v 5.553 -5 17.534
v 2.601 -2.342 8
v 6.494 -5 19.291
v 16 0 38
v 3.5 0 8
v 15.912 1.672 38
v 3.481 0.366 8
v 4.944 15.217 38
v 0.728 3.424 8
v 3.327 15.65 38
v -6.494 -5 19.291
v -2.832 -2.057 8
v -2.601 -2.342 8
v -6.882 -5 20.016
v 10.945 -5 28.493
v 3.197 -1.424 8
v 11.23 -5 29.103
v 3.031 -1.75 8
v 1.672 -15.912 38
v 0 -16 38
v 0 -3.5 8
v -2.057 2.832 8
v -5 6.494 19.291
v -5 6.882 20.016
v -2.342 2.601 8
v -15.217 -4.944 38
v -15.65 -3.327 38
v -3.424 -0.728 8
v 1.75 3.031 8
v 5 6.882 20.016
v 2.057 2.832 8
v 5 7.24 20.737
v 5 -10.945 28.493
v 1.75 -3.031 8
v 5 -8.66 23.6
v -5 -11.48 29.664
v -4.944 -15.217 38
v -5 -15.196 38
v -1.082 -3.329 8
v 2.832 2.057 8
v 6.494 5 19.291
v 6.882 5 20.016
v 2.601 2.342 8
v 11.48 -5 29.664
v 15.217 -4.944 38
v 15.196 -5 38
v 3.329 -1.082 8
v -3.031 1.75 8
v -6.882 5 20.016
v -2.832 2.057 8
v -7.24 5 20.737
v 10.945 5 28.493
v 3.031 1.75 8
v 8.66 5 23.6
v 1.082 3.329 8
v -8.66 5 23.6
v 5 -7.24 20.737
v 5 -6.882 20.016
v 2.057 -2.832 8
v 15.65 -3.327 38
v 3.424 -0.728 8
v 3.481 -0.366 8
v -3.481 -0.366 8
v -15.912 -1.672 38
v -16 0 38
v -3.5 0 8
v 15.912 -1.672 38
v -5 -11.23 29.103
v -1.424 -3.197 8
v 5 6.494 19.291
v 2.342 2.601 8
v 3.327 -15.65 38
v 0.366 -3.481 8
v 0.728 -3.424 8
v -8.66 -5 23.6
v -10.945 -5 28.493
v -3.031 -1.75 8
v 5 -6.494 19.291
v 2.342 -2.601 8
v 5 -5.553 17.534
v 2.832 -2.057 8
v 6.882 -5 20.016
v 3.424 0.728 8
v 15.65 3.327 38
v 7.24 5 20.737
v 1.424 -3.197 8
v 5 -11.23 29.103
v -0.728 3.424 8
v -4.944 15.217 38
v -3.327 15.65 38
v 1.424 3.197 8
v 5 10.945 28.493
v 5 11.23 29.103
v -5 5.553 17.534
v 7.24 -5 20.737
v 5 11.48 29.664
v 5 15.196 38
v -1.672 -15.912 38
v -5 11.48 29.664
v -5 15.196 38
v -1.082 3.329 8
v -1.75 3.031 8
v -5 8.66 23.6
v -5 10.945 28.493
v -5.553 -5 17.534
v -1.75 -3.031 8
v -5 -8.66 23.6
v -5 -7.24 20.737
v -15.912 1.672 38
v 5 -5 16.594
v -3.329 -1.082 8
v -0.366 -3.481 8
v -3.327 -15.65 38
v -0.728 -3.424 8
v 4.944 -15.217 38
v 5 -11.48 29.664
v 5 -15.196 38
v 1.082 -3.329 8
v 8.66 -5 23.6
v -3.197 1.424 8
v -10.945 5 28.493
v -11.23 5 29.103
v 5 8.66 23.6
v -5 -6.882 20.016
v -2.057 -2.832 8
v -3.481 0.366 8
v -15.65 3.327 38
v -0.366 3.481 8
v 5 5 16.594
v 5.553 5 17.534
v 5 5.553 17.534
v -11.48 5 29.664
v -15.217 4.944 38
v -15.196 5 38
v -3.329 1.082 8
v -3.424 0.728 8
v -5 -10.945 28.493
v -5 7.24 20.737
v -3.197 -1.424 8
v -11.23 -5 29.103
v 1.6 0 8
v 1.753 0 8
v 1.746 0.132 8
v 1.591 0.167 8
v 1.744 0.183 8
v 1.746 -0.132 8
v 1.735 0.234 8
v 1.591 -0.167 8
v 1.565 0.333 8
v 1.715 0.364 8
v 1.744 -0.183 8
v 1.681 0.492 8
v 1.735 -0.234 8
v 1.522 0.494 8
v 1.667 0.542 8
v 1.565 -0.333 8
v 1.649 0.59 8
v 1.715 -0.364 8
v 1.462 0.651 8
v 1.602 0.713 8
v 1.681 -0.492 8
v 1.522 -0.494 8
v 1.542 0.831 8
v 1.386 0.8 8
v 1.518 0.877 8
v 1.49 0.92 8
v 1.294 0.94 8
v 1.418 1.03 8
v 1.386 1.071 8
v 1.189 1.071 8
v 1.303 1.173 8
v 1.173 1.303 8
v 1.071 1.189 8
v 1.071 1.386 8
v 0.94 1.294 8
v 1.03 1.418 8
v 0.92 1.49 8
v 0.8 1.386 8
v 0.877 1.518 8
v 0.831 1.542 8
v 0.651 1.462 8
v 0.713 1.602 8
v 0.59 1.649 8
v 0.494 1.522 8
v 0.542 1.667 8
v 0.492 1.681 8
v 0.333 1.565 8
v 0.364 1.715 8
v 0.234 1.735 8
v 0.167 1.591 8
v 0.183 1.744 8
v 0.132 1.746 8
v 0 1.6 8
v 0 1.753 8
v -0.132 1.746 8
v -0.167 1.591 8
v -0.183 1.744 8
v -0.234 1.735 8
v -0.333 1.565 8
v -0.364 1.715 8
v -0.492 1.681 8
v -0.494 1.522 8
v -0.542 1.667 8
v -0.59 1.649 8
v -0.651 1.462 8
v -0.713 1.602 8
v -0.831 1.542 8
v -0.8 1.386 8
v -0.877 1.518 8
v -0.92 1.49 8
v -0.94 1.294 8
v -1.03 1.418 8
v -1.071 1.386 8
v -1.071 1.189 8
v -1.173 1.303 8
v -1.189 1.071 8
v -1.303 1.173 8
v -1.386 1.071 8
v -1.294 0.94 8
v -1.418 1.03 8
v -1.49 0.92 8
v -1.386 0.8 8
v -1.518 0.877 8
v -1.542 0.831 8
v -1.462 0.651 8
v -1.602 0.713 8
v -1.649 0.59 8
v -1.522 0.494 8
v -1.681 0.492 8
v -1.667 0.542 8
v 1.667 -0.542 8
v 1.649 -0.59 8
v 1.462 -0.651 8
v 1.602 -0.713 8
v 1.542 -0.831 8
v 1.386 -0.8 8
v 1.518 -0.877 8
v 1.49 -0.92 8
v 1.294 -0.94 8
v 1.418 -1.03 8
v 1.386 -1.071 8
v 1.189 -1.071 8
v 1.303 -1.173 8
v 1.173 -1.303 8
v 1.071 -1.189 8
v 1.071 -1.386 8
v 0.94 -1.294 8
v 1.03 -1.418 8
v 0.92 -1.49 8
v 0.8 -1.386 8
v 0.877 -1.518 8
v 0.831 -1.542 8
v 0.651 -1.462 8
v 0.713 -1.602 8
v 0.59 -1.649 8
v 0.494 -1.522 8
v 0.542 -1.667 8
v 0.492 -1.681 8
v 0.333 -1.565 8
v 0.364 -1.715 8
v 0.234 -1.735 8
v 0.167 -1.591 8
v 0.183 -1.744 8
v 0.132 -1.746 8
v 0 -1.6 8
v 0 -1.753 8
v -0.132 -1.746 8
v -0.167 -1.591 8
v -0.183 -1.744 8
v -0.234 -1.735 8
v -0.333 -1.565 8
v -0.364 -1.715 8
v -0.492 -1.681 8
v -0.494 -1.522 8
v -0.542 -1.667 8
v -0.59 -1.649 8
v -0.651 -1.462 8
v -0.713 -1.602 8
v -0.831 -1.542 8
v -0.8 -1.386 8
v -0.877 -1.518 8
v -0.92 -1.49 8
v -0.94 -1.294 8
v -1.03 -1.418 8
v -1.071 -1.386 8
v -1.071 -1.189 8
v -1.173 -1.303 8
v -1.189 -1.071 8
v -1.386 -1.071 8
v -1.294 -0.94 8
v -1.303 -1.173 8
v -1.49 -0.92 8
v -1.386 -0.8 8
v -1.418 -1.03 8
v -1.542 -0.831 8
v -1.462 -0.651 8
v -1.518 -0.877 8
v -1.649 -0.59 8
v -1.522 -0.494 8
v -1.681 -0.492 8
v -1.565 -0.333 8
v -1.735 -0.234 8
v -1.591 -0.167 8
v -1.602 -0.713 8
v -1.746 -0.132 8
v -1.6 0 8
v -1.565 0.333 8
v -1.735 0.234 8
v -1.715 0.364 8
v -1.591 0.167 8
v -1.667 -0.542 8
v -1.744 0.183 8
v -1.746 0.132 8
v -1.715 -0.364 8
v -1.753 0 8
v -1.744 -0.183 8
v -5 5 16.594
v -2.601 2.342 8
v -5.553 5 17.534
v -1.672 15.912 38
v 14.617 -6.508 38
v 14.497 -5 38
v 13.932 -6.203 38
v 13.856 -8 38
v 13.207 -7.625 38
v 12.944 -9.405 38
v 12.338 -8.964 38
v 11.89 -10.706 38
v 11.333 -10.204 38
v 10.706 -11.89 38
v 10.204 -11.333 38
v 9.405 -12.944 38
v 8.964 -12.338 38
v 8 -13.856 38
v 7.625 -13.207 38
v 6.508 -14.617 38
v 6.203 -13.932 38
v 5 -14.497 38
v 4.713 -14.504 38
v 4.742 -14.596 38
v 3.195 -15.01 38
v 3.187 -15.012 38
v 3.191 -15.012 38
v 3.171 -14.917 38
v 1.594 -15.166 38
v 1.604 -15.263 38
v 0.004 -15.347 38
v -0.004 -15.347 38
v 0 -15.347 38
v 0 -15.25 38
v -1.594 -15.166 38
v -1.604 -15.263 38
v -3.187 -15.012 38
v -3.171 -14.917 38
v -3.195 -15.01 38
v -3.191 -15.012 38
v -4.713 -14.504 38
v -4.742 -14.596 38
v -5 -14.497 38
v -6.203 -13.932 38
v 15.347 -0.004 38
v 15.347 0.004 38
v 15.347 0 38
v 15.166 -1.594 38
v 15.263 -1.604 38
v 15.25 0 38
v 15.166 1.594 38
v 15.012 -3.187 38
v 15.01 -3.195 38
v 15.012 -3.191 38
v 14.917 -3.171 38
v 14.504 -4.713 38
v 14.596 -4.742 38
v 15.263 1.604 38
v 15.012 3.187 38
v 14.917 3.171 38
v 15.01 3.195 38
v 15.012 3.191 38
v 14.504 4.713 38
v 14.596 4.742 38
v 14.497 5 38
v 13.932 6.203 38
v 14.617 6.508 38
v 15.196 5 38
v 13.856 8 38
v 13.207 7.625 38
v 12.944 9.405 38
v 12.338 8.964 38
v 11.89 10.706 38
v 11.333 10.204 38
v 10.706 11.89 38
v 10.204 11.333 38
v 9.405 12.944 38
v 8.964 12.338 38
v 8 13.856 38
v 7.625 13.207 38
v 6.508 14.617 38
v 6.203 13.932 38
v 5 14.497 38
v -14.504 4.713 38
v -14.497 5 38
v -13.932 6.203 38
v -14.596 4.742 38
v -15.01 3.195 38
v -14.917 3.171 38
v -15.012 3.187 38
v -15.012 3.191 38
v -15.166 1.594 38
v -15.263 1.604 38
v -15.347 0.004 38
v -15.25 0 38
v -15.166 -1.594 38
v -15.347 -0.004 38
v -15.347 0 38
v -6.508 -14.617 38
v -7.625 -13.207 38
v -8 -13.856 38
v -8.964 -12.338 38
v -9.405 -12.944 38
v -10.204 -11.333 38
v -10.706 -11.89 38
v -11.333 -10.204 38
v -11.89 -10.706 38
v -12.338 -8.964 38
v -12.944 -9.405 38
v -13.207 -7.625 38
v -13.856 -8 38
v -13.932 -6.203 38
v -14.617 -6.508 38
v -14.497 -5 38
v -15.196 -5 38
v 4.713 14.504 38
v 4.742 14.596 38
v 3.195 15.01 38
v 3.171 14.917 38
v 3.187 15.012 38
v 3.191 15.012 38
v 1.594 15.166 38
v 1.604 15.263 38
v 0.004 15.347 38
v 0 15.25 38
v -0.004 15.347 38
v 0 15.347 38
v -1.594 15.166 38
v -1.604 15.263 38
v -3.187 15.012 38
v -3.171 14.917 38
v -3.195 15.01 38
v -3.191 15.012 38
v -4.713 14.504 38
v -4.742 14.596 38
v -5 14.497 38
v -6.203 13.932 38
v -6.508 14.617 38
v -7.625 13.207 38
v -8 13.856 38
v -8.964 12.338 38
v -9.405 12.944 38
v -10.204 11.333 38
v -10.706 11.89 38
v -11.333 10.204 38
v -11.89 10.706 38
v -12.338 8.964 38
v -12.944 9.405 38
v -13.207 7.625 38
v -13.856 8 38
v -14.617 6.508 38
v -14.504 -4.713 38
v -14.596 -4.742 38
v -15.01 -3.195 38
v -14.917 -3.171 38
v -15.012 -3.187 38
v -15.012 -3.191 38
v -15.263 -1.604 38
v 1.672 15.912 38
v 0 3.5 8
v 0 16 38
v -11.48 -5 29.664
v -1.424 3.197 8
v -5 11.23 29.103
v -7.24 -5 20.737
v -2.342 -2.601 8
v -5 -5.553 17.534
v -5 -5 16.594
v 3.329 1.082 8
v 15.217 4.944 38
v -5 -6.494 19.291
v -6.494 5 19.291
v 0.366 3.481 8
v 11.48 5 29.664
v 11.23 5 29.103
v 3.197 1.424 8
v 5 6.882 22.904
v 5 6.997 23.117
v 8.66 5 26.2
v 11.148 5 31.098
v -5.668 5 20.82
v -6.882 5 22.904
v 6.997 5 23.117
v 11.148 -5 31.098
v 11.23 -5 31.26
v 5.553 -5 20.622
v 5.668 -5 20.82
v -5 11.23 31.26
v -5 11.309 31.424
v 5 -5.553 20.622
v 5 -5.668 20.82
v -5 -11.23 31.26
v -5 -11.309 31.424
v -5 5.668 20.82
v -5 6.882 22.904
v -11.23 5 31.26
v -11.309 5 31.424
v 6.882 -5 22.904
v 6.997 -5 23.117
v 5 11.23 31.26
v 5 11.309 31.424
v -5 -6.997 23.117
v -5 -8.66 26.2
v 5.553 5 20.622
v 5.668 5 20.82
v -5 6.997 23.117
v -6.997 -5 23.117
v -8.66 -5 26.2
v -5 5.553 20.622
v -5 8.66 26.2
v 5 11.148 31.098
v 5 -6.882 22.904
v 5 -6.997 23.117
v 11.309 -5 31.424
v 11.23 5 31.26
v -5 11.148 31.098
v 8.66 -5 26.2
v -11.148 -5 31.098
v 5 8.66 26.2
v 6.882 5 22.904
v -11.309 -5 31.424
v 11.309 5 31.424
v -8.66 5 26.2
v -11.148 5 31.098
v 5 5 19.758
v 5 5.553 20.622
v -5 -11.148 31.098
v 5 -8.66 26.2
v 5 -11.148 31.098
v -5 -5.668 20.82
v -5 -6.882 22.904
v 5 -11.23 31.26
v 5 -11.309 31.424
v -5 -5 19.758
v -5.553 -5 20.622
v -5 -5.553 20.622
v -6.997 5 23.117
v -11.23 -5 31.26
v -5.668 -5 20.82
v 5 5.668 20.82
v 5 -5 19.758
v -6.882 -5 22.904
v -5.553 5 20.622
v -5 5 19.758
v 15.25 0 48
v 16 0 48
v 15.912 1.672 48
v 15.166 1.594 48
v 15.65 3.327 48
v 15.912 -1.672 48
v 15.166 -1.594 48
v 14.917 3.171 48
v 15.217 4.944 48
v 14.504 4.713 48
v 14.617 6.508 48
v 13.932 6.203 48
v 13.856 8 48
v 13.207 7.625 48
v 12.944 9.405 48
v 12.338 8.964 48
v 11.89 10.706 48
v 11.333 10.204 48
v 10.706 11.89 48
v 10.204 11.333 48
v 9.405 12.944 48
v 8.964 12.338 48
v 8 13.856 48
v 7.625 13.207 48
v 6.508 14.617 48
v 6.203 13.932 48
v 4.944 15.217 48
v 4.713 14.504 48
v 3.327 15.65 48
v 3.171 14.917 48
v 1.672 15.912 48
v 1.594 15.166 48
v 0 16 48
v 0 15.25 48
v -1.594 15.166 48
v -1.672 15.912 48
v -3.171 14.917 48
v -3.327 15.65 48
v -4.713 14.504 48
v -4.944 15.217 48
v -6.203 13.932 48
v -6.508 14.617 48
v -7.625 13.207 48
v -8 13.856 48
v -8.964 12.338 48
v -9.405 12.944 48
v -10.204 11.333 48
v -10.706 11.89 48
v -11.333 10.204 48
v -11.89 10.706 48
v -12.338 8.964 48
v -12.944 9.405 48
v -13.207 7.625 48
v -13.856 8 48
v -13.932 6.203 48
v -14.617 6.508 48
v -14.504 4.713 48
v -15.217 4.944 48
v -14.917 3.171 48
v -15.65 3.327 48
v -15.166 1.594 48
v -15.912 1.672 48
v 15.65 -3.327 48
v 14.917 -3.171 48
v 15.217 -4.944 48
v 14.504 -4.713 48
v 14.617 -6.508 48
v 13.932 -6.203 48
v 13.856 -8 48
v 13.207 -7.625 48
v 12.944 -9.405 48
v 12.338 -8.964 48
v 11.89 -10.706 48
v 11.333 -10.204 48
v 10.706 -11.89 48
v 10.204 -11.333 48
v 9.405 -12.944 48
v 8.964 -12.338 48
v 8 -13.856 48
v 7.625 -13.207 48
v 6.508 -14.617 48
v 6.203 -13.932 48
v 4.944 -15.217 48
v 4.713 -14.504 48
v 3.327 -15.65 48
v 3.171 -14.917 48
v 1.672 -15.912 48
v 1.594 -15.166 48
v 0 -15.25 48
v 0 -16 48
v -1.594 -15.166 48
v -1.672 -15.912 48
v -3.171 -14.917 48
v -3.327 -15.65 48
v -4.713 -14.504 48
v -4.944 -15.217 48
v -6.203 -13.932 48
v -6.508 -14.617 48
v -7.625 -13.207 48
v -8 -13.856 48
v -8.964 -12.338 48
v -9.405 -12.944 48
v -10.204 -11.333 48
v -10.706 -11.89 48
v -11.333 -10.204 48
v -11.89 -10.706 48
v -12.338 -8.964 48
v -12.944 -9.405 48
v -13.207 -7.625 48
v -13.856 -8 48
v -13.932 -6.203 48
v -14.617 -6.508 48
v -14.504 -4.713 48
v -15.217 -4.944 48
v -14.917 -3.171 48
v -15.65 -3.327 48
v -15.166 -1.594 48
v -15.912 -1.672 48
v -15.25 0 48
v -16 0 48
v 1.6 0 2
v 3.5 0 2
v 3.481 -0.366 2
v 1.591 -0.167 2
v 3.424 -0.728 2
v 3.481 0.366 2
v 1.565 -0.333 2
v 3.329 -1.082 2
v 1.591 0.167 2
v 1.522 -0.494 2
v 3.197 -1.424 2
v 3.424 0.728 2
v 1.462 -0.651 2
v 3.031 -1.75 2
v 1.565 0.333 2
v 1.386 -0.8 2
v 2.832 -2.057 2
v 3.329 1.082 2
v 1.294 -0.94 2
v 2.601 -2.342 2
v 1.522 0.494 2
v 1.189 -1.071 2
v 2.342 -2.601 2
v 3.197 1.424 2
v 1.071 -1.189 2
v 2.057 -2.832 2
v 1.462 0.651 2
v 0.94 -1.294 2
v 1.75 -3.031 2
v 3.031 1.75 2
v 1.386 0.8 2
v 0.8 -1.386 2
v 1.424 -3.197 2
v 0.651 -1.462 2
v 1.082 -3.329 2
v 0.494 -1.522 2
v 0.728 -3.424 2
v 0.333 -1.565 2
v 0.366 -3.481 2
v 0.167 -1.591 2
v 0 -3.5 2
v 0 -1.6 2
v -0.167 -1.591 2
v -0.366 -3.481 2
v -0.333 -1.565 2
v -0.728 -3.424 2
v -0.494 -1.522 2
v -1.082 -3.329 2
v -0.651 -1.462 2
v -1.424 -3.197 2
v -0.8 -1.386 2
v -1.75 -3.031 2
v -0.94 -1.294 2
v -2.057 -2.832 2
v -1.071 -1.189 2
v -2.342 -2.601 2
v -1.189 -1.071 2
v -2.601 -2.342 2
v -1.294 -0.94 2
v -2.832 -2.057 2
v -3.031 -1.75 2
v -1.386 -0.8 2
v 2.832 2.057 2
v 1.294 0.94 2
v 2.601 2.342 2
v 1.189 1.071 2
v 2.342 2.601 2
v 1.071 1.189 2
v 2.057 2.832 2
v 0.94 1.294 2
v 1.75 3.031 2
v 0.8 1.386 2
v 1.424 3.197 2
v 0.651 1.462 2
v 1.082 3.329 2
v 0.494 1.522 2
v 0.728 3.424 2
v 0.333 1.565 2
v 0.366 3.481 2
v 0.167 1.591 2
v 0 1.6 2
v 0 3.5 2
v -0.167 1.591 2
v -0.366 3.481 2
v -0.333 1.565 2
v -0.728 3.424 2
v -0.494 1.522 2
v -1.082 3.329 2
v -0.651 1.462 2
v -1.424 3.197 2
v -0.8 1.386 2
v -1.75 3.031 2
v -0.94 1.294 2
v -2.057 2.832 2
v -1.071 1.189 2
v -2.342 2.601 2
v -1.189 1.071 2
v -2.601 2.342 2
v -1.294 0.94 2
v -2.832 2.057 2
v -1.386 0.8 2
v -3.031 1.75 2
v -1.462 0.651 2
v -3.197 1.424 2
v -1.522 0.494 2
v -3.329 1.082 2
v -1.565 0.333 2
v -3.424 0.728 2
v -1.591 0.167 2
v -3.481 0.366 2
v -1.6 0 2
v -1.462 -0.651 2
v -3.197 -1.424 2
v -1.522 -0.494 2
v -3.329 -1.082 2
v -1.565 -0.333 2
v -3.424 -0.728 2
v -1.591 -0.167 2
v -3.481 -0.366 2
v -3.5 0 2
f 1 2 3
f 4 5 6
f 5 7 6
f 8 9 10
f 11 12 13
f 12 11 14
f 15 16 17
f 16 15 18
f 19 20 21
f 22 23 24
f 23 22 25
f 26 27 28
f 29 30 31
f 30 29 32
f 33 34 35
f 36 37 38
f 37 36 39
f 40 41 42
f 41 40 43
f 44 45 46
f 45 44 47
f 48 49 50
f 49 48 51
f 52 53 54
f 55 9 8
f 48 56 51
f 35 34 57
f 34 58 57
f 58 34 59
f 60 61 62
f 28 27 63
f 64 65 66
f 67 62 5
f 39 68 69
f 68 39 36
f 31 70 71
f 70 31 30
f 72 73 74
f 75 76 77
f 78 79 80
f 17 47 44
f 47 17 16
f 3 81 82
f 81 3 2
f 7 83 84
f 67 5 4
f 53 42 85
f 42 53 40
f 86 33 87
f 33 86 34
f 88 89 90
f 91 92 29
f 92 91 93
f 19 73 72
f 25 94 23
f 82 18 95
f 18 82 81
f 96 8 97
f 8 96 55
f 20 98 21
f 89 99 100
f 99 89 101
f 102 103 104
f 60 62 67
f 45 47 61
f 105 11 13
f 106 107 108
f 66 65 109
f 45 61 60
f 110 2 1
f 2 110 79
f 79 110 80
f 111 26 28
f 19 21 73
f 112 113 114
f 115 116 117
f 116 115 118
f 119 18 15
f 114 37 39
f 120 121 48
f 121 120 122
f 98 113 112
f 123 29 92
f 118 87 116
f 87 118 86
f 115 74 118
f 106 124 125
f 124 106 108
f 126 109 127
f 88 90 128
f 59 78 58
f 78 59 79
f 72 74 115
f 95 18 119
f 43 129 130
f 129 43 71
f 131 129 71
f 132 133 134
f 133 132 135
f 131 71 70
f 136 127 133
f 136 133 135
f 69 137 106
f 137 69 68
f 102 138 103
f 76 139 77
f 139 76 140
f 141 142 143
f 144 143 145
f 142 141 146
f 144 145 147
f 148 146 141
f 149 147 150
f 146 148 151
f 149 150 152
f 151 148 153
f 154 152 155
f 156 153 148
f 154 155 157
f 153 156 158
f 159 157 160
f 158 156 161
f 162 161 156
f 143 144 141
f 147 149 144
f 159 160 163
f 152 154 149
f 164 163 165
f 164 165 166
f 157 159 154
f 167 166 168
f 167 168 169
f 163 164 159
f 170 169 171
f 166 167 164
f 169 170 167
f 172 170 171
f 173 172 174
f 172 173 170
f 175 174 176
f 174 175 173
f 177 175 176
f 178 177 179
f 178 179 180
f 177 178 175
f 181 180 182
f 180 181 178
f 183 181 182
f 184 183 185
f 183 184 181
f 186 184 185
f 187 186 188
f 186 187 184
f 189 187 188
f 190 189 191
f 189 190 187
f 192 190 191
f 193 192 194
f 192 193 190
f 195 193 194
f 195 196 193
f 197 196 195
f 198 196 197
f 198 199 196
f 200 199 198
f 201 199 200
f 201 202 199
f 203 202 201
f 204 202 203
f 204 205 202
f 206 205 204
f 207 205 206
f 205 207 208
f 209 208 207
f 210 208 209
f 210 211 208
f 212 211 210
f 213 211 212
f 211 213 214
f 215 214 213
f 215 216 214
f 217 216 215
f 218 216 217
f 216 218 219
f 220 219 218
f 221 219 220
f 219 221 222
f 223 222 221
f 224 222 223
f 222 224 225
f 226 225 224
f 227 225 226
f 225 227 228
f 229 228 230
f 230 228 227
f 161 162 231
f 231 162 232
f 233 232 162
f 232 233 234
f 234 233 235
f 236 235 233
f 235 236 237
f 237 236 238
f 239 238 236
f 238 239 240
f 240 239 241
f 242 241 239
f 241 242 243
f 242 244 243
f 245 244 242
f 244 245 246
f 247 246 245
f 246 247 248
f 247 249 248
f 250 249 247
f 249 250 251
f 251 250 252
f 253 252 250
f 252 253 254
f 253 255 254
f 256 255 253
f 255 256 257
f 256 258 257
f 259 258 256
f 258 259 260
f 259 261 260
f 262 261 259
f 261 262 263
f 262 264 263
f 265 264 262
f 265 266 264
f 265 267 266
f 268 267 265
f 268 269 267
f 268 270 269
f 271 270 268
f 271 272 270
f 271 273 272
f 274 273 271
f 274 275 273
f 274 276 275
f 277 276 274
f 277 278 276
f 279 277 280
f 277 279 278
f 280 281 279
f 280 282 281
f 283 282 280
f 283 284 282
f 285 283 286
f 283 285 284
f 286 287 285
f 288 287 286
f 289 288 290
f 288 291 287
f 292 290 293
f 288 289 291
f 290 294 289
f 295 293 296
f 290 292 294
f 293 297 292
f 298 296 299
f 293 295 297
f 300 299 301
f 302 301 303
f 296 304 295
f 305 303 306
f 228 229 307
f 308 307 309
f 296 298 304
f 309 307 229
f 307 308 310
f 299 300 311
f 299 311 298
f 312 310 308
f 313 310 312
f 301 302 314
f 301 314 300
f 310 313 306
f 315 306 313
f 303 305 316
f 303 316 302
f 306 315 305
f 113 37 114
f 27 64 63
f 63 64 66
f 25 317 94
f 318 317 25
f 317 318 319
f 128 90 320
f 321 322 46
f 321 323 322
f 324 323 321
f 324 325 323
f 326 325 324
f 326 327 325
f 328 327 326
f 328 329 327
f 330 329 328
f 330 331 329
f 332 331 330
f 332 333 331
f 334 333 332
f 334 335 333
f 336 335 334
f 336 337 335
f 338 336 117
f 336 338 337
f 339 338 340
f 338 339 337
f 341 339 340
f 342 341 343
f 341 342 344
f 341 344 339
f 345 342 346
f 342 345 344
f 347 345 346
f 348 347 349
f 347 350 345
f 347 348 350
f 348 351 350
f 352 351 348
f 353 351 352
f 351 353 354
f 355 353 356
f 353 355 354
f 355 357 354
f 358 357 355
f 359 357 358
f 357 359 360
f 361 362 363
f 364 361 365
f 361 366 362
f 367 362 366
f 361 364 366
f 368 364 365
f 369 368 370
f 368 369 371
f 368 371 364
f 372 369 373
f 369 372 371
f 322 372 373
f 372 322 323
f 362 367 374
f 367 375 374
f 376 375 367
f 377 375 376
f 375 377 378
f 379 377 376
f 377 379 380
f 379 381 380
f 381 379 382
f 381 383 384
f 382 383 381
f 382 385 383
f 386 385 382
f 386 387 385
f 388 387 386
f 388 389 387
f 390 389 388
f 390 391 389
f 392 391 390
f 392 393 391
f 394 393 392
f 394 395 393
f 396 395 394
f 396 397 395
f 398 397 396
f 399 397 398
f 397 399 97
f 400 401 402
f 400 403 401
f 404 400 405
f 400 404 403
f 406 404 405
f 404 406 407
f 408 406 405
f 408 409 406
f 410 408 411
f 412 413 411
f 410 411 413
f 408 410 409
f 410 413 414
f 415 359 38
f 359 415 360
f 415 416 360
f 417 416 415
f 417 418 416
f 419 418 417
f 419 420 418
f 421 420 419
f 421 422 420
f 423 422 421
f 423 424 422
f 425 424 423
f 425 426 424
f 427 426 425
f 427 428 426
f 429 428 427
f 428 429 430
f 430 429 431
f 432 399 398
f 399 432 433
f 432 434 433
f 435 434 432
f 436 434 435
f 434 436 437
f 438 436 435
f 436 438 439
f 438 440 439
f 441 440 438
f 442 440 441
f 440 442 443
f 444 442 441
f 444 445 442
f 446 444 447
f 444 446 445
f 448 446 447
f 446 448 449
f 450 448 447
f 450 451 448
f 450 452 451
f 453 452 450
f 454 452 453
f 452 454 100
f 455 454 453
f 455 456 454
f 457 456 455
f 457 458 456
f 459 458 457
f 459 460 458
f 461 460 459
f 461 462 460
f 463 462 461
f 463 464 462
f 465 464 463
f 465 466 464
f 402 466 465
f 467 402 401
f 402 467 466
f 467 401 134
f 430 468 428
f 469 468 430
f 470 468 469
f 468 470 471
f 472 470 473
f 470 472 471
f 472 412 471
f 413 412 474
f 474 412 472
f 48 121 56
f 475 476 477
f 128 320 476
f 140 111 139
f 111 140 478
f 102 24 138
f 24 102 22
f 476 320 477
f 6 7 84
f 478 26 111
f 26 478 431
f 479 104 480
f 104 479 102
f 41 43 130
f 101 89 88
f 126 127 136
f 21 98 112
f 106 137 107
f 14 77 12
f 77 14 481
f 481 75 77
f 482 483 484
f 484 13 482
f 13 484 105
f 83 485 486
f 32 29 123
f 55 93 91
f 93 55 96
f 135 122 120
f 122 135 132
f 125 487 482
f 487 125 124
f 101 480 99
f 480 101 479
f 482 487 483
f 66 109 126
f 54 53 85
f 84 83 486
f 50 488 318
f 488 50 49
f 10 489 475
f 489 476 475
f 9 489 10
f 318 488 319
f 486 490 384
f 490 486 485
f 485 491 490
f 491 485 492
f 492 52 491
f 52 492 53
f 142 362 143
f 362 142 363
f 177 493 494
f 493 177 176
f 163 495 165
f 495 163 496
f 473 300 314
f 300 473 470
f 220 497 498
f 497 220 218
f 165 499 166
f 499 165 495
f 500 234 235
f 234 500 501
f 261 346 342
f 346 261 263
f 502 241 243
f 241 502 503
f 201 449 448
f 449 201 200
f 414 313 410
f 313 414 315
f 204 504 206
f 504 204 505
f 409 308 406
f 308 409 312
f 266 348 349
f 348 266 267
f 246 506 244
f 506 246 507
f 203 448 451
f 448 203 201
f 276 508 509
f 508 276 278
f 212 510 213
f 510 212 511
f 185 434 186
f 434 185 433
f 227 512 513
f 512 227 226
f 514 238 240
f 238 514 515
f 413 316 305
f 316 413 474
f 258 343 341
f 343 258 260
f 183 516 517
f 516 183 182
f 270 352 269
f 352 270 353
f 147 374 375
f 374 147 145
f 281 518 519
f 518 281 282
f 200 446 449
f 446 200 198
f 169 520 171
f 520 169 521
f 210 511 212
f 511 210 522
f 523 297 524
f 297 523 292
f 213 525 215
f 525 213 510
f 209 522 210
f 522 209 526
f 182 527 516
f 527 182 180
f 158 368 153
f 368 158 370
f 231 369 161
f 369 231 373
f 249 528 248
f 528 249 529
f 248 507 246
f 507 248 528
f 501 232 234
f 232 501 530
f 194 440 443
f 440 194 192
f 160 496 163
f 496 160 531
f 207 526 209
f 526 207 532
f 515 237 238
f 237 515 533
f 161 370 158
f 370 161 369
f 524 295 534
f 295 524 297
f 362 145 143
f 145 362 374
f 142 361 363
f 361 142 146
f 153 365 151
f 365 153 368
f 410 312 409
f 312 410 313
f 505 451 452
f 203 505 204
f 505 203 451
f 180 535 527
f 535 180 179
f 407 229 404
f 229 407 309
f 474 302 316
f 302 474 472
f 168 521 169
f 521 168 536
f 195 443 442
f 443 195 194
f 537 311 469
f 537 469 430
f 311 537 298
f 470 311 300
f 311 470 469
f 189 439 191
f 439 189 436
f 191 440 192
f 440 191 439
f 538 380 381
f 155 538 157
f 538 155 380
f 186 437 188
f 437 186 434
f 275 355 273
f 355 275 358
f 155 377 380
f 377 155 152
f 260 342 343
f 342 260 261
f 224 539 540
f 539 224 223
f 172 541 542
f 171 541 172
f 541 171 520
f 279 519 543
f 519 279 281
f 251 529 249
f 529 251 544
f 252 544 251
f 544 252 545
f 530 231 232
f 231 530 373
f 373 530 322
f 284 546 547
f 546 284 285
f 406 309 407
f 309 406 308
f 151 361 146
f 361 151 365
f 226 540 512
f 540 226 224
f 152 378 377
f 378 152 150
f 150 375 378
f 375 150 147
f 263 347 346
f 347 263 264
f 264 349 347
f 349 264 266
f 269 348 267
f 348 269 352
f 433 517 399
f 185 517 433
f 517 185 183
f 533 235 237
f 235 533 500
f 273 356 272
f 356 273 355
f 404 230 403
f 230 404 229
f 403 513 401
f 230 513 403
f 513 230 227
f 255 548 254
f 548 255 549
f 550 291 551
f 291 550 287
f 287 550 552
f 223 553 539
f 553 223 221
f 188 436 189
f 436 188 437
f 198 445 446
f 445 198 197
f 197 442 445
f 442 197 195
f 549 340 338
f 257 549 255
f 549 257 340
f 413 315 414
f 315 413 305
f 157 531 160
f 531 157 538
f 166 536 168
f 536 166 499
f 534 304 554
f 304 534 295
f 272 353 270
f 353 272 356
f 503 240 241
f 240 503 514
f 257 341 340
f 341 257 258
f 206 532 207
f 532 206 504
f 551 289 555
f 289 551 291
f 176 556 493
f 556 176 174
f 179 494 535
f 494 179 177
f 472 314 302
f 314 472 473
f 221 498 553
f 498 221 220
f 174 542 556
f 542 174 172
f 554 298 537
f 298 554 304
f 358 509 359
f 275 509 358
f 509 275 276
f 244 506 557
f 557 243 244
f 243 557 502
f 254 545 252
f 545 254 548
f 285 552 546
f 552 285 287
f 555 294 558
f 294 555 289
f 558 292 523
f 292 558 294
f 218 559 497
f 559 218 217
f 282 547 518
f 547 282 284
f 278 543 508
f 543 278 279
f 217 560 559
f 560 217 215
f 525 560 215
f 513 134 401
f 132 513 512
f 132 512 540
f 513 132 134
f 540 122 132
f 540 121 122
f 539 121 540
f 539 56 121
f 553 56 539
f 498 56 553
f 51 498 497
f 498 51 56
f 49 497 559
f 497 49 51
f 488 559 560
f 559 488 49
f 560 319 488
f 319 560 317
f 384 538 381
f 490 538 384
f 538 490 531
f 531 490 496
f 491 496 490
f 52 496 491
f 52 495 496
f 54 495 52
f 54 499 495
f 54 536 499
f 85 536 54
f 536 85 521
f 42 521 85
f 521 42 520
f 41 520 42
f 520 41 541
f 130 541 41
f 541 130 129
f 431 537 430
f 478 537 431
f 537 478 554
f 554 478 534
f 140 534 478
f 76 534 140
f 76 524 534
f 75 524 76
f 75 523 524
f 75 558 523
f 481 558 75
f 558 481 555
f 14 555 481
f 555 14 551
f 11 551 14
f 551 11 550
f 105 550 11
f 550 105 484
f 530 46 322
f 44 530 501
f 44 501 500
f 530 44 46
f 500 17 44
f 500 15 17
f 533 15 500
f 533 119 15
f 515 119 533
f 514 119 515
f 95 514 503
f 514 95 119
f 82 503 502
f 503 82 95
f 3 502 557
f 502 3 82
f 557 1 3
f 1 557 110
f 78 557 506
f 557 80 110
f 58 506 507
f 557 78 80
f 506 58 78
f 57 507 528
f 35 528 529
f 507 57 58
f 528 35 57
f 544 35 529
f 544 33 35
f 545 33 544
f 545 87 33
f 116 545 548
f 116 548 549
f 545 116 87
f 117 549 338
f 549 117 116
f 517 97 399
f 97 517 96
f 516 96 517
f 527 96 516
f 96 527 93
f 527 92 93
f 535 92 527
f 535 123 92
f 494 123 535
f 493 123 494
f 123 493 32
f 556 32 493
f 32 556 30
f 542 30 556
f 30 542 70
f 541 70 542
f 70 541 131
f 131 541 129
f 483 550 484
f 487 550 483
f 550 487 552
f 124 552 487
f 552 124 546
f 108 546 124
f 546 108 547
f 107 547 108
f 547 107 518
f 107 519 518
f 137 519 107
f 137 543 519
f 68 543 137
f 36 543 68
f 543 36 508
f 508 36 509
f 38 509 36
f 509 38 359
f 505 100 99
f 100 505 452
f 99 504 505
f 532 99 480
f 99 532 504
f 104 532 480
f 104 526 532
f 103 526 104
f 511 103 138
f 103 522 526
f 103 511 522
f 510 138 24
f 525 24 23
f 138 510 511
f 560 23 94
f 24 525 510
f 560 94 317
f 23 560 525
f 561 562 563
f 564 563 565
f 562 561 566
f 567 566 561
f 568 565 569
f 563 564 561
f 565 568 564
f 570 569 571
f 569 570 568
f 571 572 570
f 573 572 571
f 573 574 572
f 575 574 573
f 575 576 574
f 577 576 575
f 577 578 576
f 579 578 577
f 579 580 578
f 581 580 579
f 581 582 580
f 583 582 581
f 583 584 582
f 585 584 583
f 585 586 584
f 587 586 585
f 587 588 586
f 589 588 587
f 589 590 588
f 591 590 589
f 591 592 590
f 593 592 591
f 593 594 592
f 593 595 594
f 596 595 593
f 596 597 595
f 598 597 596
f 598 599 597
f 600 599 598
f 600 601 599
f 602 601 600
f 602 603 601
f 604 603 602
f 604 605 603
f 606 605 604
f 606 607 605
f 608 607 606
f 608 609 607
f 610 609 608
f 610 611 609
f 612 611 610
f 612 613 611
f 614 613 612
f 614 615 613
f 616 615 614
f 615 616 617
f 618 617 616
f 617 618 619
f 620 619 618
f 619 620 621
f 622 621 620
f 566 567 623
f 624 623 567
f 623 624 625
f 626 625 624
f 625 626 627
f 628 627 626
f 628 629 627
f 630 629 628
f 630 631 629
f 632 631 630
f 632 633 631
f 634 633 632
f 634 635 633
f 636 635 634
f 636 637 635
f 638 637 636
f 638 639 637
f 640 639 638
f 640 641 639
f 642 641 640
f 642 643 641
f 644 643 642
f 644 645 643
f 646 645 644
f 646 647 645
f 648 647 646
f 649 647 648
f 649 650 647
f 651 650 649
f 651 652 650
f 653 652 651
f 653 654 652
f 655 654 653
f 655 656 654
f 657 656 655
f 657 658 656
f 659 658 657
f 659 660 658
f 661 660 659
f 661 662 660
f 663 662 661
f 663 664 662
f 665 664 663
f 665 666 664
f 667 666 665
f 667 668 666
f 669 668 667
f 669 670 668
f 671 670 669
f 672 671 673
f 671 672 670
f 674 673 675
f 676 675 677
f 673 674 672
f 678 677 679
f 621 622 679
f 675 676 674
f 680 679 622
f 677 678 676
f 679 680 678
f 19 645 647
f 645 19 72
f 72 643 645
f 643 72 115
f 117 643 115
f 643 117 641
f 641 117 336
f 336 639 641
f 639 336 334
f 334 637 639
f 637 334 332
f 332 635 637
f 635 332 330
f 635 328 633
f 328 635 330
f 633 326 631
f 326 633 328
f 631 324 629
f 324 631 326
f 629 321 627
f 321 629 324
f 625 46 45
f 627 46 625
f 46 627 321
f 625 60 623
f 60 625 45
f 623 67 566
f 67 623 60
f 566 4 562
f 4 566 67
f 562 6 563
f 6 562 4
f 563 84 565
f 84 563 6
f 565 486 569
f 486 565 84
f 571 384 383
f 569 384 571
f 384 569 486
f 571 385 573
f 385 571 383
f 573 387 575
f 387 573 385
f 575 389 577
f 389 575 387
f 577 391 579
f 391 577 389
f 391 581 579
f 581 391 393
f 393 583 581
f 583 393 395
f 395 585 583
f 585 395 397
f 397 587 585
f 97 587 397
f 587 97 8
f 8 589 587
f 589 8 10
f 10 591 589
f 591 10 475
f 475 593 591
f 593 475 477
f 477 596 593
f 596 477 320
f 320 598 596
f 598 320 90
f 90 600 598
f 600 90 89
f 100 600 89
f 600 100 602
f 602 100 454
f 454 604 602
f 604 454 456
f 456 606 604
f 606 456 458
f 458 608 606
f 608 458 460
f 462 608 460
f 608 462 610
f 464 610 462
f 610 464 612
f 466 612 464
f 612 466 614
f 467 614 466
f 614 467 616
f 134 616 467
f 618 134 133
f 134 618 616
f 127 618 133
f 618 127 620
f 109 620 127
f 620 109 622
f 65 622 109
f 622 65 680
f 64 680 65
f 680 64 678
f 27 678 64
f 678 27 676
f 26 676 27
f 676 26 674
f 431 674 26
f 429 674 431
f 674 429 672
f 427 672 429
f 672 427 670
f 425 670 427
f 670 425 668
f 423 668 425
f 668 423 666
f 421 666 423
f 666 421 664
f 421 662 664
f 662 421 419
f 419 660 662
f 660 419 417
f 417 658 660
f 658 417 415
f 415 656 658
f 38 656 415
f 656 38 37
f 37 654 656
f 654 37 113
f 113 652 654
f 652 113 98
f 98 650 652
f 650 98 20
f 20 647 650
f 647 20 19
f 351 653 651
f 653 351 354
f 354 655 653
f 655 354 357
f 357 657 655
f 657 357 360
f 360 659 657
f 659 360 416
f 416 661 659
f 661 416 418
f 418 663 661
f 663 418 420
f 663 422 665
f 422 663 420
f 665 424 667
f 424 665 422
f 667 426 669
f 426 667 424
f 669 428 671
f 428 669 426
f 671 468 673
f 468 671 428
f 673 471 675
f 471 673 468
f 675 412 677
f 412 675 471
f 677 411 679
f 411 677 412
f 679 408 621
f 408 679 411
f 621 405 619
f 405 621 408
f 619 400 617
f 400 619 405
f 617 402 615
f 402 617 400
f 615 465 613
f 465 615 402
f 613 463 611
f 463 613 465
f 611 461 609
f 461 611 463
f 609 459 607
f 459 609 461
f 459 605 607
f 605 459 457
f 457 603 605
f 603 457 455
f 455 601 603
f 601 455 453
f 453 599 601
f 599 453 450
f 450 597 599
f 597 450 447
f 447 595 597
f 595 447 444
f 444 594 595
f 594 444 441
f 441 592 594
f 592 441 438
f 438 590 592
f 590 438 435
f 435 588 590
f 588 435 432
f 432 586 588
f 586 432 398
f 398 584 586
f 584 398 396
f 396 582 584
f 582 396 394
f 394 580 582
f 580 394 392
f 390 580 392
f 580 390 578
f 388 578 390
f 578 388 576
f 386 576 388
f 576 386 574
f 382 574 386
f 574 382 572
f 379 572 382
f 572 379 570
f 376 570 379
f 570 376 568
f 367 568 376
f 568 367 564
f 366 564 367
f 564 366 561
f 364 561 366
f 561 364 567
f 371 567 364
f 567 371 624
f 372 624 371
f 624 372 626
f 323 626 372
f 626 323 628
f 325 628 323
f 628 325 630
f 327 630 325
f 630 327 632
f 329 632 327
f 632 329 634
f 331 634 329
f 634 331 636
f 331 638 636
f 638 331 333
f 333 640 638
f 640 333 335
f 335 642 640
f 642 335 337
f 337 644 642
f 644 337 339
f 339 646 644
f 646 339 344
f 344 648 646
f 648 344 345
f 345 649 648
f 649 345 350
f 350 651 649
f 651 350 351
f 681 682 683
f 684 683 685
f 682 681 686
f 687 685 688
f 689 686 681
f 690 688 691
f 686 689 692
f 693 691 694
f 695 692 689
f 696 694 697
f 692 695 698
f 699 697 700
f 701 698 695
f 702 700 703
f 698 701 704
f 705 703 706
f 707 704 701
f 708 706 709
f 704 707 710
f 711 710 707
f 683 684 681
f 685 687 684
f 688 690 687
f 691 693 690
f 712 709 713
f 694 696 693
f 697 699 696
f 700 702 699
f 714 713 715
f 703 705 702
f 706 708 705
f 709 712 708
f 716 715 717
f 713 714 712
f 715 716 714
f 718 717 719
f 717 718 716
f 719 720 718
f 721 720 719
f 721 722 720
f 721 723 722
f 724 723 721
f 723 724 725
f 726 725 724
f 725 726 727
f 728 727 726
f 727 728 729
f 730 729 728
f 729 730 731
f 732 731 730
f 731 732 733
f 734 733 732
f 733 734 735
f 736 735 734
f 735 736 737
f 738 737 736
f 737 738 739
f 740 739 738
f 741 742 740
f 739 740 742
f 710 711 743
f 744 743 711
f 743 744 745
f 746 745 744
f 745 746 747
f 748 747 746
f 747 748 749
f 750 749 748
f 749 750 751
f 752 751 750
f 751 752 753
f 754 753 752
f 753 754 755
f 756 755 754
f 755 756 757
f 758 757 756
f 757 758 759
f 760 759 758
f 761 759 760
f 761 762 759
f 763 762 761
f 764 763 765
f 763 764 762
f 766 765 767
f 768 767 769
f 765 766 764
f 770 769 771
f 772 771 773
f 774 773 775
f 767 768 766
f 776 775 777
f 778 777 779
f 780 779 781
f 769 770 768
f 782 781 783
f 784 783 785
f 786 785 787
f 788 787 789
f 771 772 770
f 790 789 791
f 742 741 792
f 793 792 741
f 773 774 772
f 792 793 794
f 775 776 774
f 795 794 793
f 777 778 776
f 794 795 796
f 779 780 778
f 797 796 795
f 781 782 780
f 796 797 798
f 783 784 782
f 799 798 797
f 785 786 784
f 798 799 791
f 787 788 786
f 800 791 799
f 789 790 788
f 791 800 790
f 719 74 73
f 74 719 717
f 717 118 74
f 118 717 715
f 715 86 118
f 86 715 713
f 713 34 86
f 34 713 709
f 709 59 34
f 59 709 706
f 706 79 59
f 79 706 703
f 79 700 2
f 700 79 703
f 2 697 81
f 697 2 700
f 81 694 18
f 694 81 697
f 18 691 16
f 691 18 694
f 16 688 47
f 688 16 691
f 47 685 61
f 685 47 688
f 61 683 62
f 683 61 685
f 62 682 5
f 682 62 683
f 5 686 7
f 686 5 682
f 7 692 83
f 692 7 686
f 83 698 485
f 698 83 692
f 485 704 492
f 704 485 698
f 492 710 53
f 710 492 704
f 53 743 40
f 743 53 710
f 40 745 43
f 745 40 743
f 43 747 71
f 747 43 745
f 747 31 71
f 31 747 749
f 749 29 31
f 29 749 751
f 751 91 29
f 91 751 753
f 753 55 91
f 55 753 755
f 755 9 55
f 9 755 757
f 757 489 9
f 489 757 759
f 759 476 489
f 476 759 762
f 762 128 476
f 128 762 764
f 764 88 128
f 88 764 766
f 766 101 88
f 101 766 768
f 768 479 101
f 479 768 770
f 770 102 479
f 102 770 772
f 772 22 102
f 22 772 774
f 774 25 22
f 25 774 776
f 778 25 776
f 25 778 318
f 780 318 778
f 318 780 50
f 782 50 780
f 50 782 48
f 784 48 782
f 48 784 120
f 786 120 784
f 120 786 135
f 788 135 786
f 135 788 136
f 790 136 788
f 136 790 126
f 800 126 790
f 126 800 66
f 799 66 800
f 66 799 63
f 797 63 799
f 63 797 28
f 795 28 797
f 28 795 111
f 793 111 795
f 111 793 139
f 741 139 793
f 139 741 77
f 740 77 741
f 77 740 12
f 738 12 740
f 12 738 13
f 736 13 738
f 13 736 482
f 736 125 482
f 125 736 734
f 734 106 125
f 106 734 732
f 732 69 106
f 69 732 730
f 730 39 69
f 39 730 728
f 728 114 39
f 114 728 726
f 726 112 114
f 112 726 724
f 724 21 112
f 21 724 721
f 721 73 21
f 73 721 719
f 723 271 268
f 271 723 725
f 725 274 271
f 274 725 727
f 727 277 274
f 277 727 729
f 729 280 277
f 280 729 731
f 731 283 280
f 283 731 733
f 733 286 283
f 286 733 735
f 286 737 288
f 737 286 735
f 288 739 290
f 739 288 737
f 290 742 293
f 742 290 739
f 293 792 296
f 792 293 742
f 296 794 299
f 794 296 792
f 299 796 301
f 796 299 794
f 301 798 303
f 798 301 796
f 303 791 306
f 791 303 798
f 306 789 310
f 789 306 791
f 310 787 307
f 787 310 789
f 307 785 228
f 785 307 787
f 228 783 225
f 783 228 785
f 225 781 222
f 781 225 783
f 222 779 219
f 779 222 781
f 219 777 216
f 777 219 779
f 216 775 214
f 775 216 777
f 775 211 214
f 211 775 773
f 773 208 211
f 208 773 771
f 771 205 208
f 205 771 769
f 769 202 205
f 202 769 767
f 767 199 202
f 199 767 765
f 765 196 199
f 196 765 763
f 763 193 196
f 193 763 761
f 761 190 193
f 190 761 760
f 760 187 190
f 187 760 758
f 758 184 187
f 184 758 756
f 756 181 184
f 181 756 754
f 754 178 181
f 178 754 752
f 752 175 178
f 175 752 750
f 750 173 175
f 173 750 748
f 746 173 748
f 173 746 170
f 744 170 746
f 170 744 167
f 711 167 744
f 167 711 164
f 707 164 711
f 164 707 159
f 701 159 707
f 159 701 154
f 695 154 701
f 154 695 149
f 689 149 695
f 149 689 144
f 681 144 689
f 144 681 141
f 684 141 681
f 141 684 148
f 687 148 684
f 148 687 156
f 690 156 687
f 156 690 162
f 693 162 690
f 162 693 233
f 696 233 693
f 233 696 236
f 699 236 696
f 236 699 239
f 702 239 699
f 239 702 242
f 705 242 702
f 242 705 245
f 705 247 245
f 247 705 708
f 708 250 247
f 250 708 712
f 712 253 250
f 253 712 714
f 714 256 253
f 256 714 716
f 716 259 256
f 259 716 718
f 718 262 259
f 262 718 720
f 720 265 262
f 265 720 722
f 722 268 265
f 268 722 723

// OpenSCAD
$fn = 60;

*linear_extrude(3.5)
difference(){
    circle(5);
    circle(3.3 + 0.2);
}

translate([0,0, 30 + 8])
linear_extrude(10)
difference(){
    circle(32 / 2);
    circle(30.5 / 2);
}


translate([0,0,2])
linear_extrude(6)
difference(){
    circle(7 / 2);
    circle(3.4 / 2 -0.1);
}

intersection() {
    difference() {
        translate([0,0,8])
        cylinder(30, 3.5, 16);
        
        translate([0,0,7])
        cylinder(32, 1.3, 15.8);
    }
    
    union(){
        cube([40,10, 100], center=true);
        cube([10,40, 100], center=true);
    }
}
